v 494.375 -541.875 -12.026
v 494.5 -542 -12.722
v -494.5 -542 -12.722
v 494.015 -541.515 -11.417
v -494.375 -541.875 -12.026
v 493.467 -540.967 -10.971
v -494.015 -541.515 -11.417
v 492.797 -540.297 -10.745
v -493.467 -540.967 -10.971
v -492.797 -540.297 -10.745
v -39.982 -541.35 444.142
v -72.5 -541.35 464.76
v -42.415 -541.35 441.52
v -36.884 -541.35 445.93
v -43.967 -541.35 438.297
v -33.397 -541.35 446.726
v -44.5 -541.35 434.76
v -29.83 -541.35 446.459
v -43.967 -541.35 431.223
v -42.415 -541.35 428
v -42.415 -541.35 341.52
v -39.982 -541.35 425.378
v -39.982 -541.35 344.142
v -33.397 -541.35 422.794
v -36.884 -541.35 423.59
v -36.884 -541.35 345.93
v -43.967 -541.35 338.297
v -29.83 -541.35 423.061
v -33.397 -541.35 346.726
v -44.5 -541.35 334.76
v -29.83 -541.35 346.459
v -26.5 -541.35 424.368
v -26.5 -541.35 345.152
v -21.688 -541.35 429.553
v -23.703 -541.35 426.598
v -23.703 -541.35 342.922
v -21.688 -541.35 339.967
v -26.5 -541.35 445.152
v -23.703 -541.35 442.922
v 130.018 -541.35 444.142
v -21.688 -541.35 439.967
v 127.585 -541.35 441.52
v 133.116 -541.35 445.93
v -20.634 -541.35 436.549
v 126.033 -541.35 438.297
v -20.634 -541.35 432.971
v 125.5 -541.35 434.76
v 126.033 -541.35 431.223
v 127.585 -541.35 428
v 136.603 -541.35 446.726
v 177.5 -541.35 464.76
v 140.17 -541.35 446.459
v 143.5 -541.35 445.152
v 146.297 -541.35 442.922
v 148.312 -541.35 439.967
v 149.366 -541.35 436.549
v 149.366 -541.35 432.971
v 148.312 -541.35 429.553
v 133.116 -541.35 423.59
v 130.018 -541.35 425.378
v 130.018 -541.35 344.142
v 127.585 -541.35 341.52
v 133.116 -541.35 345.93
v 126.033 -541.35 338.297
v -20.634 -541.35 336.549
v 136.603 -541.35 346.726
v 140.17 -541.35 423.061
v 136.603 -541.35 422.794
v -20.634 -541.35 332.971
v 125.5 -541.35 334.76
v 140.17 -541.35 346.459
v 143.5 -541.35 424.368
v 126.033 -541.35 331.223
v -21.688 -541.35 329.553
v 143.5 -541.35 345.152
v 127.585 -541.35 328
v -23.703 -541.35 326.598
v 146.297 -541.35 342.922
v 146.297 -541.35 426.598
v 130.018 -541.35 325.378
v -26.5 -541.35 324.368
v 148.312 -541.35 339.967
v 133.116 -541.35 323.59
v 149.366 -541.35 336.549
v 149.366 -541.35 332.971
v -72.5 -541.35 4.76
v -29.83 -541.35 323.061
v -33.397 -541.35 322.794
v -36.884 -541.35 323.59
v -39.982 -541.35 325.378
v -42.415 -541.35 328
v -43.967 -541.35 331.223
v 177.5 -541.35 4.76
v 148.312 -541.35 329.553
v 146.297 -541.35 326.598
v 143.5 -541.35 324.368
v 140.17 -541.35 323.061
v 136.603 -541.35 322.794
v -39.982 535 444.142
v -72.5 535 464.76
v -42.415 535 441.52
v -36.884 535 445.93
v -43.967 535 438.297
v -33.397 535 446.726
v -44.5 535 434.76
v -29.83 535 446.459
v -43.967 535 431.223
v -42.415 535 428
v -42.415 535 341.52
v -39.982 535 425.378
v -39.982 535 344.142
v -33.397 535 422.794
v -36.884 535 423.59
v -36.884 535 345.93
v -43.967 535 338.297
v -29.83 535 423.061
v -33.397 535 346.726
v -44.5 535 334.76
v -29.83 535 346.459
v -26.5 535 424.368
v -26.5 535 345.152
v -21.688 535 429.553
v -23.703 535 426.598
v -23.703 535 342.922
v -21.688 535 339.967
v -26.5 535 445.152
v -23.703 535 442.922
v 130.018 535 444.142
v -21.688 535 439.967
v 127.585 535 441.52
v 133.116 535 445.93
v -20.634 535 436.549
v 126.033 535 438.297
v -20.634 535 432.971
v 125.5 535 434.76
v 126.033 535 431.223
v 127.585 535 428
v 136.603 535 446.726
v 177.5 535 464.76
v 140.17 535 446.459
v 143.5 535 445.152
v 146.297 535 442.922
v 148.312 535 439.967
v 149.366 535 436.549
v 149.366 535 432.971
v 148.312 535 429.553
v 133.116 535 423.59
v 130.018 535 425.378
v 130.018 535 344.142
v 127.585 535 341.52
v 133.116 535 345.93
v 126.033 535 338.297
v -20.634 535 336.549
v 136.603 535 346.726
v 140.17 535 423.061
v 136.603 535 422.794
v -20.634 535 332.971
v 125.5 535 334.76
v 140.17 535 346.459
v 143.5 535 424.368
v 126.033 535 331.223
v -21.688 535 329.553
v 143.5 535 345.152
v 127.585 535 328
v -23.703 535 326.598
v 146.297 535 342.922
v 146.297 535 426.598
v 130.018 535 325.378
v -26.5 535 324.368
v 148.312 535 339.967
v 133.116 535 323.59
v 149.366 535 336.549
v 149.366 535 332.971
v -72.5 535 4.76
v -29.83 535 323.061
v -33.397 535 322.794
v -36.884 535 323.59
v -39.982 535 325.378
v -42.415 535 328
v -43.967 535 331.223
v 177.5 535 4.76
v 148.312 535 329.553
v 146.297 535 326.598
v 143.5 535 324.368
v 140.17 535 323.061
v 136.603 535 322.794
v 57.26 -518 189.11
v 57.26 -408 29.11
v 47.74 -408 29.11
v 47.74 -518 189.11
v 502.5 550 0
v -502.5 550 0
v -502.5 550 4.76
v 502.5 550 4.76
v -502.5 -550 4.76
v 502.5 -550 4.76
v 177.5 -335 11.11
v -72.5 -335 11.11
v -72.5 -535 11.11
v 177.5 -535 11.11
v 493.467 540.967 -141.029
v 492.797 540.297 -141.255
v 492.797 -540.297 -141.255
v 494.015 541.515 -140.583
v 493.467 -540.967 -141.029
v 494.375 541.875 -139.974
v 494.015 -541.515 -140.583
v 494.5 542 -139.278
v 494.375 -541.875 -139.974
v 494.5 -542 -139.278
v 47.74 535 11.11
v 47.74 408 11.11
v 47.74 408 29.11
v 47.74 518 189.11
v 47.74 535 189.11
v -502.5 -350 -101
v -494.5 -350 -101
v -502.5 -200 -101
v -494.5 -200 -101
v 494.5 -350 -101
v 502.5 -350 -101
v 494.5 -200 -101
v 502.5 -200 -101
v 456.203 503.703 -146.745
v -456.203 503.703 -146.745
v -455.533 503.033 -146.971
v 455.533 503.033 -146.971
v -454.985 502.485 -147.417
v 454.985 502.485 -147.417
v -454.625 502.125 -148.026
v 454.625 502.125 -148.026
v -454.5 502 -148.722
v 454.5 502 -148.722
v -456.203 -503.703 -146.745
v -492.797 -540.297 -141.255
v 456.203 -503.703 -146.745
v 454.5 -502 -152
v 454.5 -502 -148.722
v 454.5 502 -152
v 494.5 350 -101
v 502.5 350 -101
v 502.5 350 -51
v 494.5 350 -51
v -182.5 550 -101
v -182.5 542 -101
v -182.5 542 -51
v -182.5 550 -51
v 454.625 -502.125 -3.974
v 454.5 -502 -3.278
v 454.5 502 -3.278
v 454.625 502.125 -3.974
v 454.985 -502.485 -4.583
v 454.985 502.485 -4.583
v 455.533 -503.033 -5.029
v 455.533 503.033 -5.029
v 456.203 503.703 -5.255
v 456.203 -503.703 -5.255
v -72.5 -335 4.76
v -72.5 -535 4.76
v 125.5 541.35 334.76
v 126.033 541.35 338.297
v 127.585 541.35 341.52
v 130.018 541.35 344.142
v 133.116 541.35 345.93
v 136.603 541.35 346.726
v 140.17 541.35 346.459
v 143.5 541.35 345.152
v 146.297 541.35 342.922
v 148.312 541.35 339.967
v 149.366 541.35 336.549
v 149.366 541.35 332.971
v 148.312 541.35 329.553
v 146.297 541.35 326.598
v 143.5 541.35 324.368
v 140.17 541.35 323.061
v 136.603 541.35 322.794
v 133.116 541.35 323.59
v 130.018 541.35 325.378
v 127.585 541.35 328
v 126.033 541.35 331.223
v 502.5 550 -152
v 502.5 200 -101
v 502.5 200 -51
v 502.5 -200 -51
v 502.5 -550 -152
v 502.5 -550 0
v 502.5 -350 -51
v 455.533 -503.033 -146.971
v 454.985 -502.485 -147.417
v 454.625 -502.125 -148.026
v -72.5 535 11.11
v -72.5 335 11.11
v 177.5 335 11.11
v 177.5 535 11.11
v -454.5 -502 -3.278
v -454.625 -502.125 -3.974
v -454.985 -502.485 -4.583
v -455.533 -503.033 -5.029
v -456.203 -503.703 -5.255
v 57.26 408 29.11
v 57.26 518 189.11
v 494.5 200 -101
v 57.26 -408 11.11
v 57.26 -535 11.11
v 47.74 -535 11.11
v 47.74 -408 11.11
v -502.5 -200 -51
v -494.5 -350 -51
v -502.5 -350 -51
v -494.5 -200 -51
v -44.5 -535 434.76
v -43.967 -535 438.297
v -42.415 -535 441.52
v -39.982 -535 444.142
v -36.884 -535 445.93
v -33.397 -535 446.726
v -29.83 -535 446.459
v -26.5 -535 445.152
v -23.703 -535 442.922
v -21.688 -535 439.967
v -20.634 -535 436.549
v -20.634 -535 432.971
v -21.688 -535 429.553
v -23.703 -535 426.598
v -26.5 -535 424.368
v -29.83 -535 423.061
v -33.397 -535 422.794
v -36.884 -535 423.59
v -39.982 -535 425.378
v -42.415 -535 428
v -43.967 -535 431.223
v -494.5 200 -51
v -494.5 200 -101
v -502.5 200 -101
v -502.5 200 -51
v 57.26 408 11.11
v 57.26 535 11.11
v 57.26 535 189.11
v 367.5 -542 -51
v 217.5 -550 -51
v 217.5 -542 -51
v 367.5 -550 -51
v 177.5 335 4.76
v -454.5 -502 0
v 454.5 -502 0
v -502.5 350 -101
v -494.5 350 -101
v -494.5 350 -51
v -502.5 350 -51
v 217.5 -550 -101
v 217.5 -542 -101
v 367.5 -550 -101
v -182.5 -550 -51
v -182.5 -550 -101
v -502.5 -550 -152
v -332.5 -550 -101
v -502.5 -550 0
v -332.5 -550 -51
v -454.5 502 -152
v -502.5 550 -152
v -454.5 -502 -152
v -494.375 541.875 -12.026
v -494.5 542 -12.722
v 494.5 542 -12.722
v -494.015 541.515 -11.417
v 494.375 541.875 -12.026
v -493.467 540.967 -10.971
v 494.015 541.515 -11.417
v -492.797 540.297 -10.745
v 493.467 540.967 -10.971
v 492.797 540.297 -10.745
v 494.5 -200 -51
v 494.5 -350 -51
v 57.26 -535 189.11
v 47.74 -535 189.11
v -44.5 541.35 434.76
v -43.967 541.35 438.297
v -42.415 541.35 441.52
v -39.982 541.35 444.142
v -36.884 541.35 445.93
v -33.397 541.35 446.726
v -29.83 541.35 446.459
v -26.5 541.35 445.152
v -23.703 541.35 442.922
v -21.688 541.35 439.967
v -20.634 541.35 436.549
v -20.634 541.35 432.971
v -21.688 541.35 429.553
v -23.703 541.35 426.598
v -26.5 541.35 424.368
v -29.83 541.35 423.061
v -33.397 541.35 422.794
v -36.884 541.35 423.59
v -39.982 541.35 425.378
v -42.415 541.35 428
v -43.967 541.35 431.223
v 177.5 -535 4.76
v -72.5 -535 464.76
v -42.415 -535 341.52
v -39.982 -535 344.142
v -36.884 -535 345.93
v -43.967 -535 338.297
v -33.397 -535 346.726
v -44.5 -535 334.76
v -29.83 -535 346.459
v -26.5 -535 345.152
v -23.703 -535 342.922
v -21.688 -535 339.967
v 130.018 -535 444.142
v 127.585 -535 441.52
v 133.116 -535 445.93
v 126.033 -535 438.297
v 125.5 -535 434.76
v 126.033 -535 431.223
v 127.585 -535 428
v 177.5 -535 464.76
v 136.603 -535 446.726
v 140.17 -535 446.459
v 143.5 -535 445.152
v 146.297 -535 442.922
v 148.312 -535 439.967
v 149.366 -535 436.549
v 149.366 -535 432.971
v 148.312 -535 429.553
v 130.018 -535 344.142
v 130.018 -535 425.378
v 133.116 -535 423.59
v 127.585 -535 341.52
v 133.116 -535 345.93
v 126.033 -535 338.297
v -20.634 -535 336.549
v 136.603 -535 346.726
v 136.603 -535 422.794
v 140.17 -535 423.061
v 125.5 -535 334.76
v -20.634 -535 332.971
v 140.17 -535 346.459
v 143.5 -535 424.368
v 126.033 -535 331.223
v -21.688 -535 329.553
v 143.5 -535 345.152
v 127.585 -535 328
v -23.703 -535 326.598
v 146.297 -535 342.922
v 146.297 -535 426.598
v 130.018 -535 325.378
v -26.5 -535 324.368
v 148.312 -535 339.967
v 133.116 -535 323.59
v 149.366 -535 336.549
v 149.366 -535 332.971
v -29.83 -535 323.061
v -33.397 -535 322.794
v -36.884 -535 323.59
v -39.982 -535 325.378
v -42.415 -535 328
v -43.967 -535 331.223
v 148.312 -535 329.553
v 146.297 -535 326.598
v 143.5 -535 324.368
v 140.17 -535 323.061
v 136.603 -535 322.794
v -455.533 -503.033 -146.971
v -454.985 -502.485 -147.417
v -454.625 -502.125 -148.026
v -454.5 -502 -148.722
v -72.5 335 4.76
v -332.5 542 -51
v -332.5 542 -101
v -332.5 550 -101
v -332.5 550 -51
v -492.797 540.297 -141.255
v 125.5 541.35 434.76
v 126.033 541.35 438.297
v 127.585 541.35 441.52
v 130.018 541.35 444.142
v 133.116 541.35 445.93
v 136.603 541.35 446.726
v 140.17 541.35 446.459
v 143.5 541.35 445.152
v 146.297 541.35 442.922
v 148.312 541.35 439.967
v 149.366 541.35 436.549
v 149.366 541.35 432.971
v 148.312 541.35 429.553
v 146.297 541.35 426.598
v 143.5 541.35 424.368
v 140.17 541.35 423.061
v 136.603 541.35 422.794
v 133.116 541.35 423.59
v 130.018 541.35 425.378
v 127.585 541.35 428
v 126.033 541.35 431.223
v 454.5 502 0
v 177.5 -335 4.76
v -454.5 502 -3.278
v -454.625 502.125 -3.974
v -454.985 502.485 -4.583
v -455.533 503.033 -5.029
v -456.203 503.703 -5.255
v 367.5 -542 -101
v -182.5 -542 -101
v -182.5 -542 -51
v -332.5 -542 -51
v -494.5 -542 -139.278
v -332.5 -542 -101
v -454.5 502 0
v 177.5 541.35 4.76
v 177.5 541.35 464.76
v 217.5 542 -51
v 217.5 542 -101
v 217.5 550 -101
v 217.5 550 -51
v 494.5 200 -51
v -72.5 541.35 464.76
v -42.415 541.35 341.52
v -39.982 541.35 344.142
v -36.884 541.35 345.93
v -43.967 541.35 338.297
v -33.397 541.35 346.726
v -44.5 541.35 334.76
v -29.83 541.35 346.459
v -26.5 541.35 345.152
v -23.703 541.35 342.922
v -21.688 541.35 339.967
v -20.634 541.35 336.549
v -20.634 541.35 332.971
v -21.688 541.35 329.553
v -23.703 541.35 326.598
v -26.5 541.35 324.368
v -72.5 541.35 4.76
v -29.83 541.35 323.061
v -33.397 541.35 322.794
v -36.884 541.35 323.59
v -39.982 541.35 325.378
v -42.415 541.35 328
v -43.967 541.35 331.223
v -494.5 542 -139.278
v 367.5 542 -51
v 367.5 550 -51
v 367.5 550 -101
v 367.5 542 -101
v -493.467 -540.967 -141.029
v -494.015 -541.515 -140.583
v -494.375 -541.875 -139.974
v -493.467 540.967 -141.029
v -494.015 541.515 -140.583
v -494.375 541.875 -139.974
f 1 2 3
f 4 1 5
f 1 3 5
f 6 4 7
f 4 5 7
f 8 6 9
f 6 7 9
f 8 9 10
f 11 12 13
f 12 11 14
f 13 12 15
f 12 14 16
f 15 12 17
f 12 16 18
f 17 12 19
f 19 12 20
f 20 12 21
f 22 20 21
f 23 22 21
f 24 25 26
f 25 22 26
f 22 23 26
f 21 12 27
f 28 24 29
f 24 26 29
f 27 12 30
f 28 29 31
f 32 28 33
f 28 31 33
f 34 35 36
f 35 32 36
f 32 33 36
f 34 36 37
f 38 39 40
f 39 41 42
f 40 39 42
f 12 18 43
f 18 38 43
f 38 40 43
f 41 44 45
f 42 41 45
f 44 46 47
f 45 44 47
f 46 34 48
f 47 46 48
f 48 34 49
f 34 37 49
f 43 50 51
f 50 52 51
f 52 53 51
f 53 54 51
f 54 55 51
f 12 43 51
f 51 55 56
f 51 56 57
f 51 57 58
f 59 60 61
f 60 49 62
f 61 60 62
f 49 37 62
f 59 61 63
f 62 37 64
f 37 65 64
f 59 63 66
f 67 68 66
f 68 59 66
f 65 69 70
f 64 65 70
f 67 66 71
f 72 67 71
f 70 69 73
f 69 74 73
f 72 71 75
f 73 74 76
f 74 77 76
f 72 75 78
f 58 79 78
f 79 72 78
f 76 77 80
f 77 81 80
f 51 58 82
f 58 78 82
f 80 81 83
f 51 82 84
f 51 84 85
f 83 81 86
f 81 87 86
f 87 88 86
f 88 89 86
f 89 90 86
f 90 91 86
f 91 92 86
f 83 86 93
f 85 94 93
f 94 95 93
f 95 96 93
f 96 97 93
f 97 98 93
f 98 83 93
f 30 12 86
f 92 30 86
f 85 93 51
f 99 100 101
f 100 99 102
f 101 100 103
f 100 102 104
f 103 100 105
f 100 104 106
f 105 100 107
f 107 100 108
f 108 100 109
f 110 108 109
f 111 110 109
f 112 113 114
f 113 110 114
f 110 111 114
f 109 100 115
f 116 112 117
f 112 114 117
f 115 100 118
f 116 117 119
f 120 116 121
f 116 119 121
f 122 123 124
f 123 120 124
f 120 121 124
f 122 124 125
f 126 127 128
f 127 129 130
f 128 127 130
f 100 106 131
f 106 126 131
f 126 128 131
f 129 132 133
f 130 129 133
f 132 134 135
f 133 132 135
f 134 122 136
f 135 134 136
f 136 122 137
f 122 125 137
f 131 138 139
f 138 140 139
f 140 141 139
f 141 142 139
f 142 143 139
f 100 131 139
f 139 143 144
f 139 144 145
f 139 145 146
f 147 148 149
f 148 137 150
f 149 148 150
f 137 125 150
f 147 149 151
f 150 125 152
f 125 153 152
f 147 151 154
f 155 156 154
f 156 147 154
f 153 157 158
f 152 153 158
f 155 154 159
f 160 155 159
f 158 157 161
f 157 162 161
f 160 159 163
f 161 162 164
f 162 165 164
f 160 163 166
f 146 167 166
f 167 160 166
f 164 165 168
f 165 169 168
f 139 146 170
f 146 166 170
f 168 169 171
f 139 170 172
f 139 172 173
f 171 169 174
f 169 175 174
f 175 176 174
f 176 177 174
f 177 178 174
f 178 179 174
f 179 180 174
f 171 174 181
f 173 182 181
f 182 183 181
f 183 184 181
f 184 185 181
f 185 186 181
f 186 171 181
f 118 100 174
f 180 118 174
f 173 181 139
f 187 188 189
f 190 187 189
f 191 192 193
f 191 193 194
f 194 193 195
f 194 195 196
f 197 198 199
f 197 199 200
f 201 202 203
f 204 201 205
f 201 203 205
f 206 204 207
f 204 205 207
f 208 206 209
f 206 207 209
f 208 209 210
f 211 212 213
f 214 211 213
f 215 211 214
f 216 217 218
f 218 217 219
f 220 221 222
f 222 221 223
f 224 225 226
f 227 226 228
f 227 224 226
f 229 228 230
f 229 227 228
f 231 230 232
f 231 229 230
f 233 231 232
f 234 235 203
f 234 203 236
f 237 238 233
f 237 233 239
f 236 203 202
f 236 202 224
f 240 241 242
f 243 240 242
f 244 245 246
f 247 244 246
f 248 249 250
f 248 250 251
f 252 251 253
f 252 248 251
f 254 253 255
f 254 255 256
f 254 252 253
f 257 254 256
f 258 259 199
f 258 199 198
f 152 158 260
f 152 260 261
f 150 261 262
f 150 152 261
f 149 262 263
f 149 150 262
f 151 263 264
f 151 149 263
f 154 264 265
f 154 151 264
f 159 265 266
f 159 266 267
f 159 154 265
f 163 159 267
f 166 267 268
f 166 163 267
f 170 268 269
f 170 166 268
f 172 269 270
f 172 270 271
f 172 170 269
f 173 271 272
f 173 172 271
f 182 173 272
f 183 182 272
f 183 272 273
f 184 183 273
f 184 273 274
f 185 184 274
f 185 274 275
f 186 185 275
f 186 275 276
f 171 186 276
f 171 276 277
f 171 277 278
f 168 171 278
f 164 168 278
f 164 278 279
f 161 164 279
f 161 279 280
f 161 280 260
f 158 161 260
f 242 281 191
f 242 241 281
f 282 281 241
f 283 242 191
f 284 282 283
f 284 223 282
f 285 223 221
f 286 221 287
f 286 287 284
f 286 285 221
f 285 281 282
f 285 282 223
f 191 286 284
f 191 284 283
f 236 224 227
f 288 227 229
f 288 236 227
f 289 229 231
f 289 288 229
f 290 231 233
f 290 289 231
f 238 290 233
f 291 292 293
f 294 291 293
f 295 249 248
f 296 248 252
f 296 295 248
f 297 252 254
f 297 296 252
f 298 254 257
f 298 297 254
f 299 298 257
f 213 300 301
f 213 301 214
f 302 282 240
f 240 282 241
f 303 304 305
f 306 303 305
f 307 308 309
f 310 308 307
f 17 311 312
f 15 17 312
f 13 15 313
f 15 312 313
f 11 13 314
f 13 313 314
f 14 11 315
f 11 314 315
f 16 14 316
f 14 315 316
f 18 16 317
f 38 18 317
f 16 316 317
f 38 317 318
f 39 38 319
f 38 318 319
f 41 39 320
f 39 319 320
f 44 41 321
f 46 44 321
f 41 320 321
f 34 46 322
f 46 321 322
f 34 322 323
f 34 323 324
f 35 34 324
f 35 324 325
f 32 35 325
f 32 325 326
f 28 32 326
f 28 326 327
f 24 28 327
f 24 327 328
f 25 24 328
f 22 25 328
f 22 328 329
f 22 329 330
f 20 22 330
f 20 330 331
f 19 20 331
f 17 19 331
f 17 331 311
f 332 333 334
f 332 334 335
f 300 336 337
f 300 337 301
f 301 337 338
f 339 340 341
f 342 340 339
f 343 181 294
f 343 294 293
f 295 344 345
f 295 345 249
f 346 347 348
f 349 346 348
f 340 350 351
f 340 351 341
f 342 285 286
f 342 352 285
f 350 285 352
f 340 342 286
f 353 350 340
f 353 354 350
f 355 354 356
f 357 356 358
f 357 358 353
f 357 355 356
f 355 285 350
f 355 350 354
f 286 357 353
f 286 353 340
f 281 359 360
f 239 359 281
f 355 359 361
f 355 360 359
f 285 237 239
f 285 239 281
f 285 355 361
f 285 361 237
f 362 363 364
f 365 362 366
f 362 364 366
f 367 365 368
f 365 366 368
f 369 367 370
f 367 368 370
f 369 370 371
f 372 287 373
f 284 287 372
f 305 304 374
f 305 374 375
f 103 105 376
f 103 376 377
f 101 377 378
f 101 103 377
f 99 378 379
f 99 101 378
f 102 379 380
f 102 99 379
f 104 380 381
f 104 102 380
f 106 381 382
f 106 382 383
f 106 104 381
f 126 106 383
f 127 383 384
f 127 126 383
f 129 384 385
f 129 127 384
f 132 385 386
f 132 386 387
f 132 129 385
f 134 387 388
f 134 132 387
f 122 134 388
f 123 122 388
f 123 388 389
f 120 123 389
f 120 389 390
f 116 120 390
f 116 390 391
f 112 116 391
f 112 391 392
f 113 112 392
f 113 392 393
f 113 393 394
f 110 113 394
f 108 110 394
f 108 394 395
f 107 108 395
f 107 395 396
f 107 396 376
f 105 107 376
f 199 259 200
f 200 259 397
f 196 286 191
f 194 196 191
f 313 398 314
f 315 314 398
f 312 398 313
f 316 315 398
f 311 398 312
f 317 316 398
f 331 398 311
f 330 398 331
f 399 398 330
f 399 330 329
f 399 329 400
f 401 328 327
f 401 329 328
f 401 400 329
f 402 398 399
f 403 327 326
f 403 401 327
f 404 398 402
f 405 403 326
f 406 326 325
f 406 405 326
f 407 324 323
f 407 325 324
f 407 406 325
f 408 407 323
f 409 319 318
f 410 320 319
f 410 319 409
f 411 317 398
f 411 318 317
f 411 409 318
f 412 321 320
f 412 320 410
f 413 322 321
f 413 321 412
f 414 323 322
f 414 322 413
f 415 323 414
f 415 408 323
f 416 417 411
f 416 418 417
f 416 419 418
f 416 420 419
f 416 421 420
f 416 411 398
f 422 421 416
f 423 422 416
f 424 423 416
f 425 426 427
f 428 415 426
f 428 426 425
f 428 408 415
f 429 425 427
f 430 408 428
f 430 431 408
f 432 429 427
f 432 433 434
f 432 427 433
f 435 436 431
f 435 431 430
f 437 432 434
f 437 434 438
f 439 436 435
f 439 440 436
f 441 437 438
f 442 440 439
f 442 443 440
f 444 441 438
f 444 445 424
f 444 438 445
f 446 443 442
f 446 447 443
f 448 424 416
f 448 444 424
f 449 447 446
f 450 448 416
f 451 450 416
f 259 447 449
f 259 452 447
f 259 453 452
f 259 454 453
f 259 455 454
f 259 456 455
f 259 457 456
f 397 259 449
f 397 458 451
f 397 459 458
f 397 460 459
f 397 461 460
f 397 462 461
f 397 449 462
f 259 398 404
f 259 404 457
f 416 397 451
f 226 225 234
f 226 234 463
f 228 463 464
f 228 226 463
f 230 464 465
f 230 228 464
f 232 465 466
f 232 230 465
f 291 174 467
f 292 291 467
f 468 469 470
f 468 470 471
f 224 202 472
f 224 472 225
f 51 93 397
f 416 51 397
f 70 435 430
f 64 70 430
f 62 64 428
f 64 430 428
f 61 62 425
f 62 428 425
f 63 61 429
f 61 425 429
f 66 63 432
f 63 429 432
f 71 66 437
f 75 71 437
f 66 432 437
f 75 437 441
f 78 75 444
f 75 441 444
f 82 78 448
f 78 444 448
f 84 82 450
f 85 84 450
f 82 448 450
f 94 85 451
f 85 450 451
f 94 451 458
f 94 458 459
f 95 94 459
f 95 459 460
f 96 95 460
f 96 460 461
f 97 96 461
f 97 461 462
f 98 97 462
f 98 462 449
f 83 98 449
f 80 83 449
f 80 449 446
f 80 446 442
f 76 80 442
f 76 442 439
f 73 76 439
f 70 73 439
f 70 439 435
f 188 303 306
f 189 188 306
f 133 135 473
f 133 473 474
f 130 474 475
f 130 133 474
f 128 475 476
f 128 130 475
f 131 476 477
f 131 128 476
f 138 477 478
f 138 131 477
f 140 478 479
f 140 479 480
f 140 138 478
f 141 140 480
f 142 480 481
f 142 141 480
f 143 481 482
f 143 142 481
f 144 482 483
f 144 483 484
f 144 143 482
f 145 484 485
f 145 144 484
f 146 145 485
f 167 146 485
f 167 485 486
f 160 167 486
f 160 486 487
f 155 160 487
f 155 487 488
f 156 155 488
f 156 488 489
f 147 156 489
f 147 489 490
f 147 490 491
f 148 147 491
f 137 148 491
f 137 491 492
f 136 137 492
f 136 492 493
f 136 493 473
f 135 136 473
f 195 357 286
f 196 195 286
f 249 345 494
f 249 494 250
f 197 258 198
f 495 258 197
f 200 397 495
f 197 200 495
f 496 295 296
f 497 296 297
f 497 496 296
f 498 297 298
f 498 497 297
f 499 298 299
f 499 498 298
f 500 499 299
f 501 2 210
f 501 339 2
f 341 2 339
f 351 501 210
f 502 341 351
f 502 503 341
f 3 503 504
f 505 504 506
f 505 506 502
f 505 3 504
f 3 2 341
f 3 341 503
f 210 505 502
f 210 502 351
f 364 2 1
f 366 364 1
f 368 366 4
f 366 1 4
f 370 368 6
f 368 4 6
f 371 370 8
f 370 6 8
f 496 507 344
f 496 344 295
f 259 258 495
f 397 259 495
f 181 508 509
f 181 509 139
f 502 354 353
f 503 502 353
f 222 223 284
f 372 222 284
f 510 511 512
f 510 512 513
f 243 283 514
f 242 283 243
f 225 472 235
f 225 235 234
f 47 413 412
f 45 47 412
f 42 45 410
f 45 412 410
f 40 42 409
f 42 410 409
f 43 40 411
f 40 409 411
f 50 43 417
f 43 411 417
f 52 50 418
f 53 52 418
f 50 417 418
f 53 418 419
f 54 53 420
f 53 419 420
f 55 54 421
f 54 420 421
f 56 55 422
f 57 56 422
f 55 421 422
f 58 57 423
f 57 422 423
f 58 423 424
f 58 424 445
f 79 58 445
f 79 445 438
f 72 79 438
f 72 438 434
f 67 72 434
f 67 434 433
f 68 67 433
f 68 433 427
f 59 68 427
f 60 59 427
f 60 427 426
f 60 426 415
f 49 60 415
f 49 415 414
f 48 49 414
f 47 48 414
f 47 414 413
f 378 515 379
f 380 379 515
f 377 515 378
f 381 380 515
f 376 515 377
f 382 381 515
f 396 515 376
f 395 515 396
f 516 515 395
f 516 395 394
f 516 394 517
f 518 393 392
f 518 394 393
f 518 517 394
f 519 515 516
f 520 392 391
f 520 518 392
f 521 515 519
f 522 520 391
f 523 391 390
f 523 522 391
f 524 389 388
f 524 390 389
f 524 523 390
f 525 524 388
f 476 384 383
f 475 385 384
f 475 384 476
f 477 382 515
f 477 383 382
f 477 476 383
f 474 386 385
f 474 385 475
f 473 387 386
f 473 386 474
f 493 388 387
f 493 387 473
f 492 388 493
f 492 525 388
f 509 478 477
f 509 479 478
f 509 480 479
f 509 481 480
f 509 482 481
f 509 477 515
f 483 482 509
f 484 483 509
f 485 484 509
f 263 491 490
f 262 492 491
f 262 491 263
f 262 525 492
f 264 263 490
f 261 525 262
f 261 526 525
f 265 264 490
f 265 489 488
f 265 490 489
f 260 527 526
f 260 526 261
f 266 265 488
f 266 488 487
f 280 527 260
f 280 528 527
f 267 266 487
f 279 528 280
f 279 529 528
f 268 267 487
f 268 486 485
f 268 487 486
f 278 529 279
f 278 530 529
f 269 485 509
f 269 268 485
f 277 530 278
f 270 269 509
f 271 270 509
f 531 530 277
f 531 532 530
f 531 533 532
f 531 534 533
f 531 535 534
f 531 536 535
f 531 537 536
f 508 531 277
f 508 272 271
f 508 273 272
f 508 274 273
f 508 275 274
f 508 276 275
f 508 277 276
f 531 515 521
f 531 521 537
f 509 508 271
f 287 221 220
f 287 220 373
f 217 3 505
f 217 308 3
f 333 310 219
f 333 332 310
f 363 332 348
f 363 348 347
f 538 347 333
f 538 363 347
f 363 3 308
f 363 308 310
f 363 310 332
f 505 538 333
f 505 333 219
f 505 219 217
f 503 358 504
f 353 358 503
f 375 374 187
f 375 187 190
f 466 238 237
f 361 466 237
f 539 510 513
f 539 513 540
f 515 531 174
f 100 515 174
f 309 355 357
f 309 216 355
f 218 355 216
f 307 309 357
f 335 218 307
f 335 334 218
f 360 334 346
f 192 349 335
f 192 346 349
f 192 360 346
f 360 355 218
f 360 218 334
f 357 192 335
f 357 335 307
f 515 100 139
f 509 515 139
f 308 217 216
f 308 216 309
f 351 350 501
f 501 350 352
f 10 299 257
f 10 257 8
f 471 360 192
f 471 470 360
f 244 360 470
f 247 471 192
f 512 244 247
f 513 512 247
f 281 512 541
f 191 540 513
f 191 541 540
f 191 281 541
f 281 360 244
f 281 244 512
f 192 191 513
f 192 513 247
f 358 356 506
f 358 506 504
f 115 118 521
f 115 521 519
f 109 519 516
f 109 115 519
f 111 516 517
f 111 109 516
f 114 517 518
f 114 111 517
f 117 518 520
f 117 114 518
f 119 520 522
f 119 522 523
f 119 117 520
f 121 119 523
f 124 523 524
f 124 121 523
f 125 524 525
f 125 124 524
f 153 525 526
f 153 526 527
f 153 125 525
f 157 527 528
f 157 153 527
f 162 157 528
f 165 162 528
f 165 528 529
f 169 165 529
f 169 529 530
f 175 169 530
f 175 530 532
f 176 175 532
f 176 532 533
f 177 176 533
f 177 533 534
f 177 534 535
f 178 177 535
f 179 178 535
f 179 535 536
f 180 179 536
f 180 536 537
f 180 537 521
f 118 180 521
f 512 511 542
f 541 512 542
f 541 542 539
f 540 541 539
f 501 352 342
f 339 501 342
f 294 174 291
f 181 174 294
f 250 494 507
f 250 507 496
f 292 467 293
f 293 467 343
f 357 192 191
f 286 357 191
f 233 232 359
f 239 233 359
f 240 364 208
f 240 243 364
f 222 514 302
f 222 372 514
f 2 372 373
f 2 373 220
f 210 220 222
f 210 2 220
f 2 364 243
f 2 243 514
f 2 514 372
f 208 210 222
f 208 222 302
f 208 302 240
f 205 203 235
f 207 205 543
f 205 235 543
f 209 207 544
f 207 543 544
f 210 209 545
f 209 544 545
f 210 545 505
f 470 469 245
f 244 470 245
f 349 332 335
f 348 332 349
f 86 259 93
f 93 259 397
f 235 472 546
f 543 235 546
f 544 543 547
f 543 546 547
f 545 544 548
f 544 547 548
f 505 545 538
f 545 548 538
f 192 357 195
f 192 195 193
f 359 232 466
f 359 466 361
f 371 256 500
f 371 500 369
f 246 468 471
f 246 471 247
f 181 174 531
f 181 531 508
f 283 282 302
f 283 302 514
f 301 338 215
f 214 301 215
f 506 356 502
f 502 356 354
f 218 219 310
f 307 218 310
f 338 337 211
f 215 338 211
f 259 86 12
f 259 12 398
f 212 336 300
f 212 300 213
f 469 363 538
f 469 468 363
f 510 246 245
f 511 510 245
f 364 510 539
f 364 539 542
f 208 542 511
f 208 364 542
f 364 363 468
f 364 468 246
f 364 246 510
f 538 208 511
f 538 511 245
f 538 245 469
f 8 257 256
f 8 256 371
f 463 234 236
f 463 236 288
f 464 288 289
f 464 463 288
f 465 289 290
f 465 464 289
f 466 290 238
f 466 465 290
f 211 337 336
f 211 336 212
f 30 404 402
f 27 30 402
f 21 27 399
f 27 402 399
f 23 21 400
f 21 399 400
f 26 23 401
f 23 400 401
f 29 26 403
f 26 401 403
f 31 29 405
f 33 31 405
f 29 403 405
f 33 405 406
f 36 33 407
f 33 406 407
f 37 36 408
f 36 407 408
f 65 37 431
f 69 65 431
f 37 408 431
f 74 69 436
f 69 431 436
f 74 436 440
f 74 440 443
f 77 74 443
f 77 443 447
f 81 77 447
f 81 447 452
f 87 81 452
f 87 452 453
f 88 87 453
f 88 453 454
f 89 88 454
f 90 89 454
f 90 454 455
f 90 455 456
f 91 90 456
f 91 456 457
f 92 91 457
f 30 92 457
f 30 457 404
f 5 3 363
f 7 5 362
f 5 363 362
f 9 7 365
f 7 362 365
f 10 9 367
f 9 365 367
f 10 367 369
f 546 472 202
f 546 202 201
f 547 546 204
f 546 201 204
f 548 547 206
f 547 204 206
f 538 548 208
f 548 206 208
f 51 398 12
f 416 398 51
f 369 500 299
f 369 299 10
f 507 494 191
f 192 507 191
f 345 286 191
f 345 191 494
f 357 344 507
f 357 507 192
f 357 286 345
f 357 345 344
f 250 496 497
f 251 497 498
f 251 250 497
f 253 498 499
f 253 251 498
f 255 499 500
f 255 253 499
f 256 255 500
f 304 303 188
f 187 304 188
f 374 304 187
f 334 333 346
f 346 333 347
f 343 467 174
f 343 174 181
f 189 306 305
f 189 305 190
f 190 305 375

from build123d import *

# Parameters (mm, degrees)
F0_W      = 1005
F0_H      = 1100
F1_DEPTH  = 4.76
F4_W      = 150
F4_H      = 50
F5_DEPTH  = 1005.001
F6_W      = 150
F6_H      = 50
F7_DEPTH  = 1100.001
F8_W      = 250
F8_H      = 200
F9_DEPTH  = 6.35
F10_W     = 250
F10_H     = 6.35
F11_DEPTH = 460
F12_W     = 9.52
F12_H     = 178
F13_DEPTH = 127
F14_SIZE2 = 160
F14_SIZE  = 110
F15_R     = 12
F16_DEPTH = 15.001


with BuildPart() as f1:
    # F0 (on Top) → F1 (new body)
    with BuildSketch(Plane.XY):
        Rectangle(F0_W, F0_H)
    extrude(amount=F1_DEPTH)


with BuildPart() as f3:
    # F3: sweep along a path in F3_path
    with BuildLine(Plane(origin=(502.5, 550, 0), x_dir=(0, 1, 0), z_dir=(0, 0, 1))) as f3_path:
        Line((0, 0), (-1100, 0))
        Line((-1100, 0), (-1100, 1005))
        Line((-1100, 1005), (0, 1005))
        Line((0, 1005), (0, 0))
    # F2 (on Front) → F3 (sweep)
    with BuildSketch(Plane.XZ):
        with BuildLine():
            Line((502.5, -152), (502.5, 0))
            Line((502.5, 0), (454.5, 0))
            Line((454.5, 0), (454.5, -3.2776251584))
            ThreePointArc((454.5, -3.2776251584), (454.9845195792, -4.5827378333), (456.2033190941, -5.2554978641))
            Line((456.2033190941, -5.2554978641), (492.7966809059, -10.7445021359))
            ThreePointArc((492.7966809059, -10.7445021359), (494.0154804208, -11.4172621667), (494.5, -12.7223748416))
            Line((494.5, -12.7223748416), (494.5, -139.2776251584))
            ThreePointArc((494.5, -139.2776251584), (494.0154804208, -140.5827378333), (492.7966809059, -141.2554978641))
            Line((492.7966809059, -141.2554978641), (456.2033190941, -146.7445021359))
            ThreePointArc((456.2033190941, -146.7445021359), (454.9845195792, -147.4172621667), (454.5, -148.7223748416))
            Line((454.5, -148.7223748416), (454.5, -152))
            Line((454.5, -152), (502.5, -152))
        make_face()
    sweep(path=f3_path.line, transition=Transition.RIGHT)

    # F4 (on face) → F5 (cut, through all)
    with BuildSketch(Plane.YZ.offset(502.5)):
        with Locations((-275, -76)):
            Rectangle(F4_W, F4_H)
        with Locations((275, -76)):
            Rectangle(F4_W, F4_H)
    extrude(amount=-F5_DEPTH, mode=Mode.SUBTRACT)

    # F6 (on face) → F7 (cut, through all)
    with BuildSketch(Plane.XZ.offset(550)):
        with Locations((-257.5, -76)):
            Rectangle(F6_W, F6_H)
        with Locations((292.5, -76)):
            Rectangle(F6_W, F6_H)
    extrude(amount=-F7_DEPTH, mode=Mode.SUBTRACT)


with BuildPart() as f9:
    # F8 (on face) → F9 (new body)
    with BuildSketch(Plane.XY.offset(4.76)):
        with Locations((52.5, -435)):
            Rectangle(F8_W, F8_H)
    extrude(amount=F9_DEPTH)


with BuildPart() as f11:
    # F10 (on face) → F11 (new body)
    with BuildSketch(Plane.XY.offset(4.76)):
        with Locations((52.5, -538.175)):
            Rectangle(F10_W, F10_H)
    extrude(amount=F11_DEPTH)

    # F15 (on face) → F16 (cut, through all)
    with BuildSketch(Plane(origin=(0, -535, 0), x_dir=(-1, 0, 0), z_dir=(0, 1, 0))):
        with Locations((-137.5, 434.76)):
            Circle(F15_R)
        with Locations((32.5, 434.76)):
            Circle(F15_R)
        with Locations((-137.5, 334.76)):
            Circle(F15_R)
        with Locations((32.5, 334.76)):
            Circle(F15_R)
    extrude(amount=-F16_DEPTH, mode=Mode.SUBTRACT)


with BuildPart() as f13:
    # F12 (on face) → F13 (new body)
    with BuildSketch(Plane(origin=(0, -535, 0), x_dir=(-1, 0, 0), z_dir=(0, 1, 0))):
        with Locations((-52.5, 100.11)):
            Rectangle(F12_W, F12_H)
    extrude(amount=F13_DEPTH)

    # F14
    f14_edges = [f13.edges().sort_by_distance(p)[0] for p in [
        (52.5, -408, 189.11),
    ]]
    f14_side = f13.faces().sort_by_distance((52.5, -471.5, 189.11))[0]
    chamfer(f14_edges, length=F14_SIZE, length2=F14_SIZE2, reference=f14_side)


with BuildPart() as f17_1:
    # F17: instance of F9
    add(f9.part.mirror(Plane.XZ))


with BuildPart() as f17_2:
    # F17: instance of F13
    add(f13.part.mirror(Plane.XZ))


with BuildPart() as f17_3:
    # F17: instance of F11
    add(f11.part.mirror(Plane.XZ))


solid = Compound([f1.part, f3.part, f9.part, f11.part, f13.part, f17_1.part, f17_2.part, f17_3.part])
